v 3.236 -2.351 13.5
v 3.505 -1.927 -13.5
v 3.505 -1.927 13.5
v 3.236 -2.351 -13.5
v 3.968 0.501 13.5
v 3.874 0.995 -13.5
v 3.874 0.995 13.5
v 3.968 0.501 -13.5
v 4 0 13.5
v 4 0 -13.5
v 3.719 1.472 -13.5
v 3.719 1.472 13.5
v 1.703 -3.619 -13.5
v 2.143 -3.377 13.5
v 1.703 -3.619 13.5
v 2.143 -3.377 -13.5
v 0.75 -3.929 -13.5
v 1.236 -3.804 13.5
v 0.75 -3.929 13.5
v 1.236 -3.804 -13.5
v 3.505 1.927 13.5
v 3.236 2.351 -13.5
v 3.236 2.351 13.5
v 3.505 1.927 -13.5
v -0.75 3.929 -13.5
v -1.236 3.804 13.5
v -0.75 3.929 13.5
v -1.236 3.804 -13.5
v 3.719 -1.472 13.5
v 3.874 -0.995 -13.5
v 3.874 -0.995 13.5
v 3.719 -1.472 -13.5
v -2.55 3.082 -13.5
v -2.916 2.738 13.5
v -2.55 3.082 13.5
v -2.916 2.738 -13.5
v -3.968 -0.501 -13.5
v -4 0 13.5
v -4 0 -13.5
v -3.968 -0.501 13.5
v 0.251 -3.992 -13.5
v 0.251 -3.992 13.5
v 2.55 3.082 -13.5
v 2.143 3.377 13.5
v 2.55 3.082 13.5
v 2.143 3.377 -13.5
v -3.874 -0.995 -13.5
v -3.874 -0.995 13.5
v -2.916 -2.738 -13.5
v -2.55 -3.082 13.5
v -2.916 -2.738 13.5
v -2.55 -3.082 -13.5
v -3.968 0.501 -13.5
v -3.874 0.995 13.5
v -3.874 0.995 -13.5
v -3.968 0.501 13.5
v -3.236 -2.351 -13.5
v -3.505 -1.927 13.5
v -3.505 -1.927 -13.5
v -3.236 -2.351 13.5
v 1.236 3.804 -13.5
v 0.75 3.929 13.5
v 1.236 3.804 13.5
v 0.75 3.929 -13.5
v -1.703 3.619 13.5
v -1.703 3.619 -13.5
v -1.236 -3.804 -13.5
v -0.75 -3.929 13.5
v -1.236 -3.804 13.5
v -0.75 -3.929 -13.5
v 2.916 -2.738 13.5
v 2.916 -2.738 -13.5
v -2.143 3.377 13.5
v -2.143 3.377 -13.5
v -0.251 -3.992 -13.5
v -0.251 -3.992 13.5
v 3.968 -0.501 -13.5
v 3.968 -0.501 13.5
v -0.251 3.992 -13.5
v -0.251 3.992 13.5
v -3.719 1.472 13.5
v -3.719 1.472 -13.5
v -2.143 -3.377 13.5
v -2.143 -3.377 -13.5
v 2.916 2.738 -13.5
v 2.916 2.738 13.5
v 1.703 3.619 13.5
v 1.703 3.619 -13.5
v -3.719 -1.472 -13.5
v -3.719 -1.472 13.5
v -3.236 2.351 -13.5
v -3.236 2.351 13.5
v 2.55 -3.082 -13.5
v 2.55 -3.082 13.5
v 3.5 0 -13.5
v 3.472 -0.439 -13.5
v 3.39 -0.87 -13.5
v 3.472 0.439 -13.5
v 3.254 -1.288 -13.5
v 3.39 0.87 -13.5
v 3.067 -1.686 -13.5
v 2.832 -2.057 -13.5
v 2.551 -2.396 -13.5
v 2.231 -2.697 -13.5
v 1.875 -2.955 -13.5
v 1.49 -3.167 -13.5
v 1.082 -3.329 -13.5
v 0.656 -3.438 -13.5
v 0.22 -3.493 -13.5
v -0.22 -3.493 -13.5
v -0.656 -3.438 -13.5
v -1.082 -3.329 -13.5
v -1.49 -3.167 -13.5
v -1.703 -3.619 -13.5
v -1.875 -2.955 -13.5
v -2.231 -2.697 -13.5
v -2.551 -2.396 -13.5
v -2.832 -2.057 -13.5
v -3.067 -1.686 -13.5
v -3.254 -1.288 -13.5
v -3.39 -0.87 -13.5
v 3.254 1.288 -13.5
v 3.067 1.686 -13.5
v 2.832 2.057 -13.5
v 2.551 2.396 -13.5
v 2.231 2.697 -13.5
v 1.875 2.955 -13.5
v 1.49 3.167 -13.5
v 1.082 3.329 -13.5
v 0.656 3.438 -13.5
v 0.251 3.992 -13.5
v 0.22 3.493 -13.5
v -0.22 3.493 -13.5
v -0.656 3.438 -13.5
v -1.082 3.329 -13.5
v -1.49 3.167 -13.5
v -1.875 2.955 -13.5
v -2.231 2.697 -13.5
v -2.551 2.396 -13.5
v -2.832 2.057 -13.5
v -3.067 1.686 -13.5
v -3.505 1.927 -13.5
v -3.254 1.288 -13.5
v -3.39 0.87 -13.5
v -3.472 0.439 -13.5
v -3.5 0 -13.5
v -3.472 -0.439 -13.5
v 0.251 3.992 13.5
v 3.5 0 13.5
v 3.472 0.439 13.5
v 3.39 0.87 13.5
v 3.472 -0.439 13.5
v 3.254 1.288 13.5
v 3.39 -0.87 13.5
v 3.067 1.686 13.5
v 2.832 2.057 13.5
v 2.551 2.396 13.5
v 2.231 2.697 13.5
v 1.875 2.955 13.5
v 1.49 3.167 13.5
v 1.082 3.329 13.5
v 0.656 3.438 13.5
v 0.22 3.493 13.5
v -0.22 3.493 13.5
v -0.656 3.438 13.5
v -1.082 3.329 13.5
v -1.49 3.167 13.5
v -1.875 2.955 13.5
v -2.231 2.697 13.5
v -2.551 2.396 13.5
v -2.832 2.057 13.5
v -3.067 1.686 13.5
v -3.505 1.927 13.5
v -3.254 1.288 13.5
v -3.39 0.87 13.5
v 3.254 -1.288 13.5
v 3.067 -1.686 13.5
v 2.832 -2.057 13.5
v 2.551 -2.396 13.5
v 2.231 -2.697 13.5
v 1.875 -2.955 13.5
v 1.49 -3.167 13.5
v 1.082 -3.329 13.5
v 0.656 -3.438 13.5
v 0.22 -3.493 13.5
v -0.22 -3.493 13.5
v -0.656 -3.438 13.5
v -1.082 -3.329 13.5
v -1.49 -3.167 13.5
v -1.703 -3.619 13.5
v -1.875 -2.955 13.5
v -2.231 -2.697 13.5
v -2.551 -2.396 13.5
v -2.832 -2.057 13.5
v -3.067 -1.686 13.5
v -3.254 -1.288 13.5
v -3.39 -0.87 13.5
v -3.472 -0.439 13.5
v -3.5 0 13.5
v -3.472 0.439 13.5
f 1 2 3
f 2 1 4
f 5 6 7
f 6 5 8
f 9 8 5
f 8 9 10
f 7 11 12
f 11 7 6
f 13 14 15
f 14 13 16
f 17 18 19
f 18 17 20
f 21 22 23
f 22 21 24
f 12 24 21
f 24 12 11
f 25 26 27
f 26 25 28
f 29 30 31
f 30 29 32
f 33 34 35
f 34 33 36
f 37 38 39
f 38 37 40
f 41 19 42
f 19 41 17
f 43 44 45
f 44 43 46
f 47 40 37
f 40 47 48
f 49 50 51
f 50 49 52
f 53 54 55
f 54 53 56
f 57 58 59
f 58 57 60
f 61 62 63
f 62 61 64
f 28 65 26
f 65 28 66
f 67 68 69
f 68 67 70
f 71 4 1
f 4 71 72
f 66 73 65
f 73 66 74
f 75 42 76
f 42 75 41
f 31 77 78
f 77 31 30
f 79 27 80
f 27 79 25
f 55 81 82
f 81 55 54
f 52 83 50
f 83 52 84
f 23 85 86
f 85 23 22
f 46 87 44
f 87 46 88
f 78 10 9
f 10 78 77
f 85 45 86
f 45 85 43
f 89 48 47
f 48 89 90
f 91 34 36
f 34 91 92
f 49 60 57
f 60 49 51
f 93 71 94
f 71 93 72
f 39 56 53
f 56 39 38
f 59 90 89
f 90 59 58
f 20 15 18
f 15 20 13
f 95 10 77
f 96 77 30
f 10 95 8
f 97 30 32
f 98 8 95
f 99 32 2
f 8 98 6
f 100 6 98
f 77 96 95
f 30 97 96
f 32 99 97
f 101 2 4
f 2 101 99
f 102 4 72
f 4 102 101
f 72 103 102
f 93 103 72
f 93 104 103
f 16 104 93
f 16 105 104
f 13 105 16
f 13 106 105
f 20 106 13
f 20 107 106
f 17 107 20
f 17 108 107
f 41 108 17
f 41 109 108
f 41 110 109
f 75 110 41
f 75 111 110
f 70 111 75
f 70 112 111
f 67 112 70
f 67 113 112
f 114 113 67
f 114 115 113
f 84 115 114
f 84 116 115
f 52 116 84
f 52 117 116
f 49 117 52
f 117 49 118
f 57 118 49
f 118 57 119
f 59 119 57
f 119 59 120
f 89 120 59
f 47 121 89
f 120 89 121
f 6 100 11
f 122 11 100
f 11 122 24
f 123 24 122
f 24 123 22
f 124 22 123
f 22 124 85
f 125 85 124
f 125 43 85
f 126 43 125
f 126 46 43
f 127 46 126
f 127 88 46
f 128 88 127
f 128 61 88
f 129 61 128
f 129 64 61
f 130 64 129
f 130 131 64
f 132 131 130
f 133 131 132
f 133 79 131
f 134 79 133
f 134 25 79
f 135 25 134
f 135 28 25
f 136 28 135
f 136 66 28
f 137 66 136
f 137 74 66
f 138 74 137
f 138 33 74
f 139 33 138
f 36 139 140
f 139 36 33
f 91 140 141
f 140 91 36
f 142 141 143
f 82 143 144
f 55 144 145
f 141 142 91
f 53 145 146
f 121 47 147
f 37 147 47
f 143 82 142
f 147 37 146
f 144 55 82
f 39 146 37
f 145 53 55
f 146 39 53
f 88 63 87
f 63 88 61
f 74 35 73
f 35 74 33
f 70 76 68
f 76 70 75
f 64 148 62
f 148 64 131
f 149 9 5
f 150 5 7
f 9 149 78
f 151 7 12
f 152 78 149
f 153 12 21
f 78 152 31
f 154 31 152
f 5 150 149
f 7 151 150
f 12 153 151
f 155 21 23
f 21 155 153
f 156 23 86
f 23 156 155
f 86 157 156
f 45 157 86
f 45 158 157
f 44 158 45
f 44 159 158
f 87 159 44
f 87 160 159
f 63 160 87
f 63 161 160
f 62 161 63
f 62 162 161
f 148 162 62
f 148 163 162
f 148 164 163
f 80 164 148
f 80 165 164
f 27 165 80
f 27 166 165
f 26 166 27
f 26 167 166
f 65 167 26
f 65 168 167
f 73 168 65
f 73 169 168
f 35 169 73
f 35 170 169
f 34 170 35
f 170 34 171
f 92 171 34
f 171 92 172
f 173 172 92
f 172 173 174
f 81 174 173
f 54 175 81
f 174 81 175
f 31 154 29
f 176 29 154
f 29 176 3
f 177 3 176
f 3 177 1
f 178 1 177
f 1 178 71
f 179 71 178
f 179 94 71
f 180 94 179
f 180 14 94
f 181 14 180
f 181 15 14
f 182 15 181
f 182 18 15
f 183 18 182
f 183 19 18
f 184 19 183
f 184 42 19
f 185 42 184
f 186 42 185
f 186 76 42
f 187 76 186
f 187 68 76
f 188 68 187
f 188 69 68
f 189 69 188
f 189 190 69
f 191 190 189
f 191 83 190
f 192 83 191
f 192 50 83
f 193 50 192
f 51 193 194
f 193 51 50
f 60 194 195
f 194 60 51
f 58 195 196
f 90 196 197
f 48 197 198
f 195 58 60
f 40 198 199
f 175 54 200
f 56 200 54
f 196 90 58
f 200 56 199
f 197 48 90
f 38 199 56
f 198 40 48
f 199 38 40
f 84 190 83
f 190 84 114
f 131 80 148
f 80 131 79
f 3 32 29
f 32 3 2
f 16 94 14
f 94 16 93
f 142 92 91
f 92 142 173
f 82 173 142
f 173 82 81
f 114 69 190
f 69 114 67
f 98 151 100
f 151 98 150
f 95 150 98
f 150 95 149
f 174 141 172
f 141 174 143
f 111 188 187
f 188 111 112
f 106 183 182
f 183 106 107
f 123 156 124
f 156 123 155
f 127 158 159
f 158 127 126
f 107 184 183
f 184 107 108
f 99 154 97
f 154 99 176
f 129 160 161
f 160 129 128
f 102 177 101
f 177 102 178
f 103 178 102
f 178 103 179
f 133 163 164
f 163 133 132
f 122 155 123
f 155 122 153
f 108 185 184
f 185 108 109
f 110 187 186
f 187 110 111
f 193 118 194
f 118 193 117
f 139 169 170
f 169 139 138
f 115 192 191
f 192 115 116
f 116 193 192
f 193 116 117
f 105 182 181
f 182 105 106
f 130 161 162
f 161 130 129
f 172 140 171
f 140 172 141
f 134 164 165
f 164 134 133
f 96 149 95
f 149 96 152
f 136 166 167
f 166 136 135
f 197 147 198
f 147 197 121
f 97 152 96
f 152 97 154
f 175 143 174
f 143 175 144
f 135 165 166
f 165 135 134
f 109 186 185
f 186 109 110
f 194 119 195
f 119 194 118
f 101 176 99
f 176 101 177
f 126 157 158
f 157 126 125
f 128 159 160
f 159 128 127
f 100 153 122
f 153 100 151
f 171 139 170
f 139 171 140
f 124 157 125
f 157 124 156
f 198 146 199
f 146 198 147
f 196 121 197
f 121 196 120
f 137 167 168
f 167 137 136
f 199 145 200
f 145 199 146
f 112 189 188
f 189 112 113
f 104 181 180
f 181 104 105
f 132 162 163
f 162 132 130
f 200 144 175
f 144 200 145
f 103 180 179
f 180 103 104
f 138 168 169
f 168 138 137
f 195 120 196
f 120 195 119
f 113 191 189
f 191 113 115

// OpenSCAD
$fn = 50;


difference() {
	union() {
		translate(v = [0, 0, -13.5000000000]) {
			cylinder(h = 27, r = 4.0000000000);
		}
	}
	union() {
		translate(v = [0, 0, -100.0000000000]) {
			cylinder(h = 200, r = 3.5000000000);
		}
	}
}
